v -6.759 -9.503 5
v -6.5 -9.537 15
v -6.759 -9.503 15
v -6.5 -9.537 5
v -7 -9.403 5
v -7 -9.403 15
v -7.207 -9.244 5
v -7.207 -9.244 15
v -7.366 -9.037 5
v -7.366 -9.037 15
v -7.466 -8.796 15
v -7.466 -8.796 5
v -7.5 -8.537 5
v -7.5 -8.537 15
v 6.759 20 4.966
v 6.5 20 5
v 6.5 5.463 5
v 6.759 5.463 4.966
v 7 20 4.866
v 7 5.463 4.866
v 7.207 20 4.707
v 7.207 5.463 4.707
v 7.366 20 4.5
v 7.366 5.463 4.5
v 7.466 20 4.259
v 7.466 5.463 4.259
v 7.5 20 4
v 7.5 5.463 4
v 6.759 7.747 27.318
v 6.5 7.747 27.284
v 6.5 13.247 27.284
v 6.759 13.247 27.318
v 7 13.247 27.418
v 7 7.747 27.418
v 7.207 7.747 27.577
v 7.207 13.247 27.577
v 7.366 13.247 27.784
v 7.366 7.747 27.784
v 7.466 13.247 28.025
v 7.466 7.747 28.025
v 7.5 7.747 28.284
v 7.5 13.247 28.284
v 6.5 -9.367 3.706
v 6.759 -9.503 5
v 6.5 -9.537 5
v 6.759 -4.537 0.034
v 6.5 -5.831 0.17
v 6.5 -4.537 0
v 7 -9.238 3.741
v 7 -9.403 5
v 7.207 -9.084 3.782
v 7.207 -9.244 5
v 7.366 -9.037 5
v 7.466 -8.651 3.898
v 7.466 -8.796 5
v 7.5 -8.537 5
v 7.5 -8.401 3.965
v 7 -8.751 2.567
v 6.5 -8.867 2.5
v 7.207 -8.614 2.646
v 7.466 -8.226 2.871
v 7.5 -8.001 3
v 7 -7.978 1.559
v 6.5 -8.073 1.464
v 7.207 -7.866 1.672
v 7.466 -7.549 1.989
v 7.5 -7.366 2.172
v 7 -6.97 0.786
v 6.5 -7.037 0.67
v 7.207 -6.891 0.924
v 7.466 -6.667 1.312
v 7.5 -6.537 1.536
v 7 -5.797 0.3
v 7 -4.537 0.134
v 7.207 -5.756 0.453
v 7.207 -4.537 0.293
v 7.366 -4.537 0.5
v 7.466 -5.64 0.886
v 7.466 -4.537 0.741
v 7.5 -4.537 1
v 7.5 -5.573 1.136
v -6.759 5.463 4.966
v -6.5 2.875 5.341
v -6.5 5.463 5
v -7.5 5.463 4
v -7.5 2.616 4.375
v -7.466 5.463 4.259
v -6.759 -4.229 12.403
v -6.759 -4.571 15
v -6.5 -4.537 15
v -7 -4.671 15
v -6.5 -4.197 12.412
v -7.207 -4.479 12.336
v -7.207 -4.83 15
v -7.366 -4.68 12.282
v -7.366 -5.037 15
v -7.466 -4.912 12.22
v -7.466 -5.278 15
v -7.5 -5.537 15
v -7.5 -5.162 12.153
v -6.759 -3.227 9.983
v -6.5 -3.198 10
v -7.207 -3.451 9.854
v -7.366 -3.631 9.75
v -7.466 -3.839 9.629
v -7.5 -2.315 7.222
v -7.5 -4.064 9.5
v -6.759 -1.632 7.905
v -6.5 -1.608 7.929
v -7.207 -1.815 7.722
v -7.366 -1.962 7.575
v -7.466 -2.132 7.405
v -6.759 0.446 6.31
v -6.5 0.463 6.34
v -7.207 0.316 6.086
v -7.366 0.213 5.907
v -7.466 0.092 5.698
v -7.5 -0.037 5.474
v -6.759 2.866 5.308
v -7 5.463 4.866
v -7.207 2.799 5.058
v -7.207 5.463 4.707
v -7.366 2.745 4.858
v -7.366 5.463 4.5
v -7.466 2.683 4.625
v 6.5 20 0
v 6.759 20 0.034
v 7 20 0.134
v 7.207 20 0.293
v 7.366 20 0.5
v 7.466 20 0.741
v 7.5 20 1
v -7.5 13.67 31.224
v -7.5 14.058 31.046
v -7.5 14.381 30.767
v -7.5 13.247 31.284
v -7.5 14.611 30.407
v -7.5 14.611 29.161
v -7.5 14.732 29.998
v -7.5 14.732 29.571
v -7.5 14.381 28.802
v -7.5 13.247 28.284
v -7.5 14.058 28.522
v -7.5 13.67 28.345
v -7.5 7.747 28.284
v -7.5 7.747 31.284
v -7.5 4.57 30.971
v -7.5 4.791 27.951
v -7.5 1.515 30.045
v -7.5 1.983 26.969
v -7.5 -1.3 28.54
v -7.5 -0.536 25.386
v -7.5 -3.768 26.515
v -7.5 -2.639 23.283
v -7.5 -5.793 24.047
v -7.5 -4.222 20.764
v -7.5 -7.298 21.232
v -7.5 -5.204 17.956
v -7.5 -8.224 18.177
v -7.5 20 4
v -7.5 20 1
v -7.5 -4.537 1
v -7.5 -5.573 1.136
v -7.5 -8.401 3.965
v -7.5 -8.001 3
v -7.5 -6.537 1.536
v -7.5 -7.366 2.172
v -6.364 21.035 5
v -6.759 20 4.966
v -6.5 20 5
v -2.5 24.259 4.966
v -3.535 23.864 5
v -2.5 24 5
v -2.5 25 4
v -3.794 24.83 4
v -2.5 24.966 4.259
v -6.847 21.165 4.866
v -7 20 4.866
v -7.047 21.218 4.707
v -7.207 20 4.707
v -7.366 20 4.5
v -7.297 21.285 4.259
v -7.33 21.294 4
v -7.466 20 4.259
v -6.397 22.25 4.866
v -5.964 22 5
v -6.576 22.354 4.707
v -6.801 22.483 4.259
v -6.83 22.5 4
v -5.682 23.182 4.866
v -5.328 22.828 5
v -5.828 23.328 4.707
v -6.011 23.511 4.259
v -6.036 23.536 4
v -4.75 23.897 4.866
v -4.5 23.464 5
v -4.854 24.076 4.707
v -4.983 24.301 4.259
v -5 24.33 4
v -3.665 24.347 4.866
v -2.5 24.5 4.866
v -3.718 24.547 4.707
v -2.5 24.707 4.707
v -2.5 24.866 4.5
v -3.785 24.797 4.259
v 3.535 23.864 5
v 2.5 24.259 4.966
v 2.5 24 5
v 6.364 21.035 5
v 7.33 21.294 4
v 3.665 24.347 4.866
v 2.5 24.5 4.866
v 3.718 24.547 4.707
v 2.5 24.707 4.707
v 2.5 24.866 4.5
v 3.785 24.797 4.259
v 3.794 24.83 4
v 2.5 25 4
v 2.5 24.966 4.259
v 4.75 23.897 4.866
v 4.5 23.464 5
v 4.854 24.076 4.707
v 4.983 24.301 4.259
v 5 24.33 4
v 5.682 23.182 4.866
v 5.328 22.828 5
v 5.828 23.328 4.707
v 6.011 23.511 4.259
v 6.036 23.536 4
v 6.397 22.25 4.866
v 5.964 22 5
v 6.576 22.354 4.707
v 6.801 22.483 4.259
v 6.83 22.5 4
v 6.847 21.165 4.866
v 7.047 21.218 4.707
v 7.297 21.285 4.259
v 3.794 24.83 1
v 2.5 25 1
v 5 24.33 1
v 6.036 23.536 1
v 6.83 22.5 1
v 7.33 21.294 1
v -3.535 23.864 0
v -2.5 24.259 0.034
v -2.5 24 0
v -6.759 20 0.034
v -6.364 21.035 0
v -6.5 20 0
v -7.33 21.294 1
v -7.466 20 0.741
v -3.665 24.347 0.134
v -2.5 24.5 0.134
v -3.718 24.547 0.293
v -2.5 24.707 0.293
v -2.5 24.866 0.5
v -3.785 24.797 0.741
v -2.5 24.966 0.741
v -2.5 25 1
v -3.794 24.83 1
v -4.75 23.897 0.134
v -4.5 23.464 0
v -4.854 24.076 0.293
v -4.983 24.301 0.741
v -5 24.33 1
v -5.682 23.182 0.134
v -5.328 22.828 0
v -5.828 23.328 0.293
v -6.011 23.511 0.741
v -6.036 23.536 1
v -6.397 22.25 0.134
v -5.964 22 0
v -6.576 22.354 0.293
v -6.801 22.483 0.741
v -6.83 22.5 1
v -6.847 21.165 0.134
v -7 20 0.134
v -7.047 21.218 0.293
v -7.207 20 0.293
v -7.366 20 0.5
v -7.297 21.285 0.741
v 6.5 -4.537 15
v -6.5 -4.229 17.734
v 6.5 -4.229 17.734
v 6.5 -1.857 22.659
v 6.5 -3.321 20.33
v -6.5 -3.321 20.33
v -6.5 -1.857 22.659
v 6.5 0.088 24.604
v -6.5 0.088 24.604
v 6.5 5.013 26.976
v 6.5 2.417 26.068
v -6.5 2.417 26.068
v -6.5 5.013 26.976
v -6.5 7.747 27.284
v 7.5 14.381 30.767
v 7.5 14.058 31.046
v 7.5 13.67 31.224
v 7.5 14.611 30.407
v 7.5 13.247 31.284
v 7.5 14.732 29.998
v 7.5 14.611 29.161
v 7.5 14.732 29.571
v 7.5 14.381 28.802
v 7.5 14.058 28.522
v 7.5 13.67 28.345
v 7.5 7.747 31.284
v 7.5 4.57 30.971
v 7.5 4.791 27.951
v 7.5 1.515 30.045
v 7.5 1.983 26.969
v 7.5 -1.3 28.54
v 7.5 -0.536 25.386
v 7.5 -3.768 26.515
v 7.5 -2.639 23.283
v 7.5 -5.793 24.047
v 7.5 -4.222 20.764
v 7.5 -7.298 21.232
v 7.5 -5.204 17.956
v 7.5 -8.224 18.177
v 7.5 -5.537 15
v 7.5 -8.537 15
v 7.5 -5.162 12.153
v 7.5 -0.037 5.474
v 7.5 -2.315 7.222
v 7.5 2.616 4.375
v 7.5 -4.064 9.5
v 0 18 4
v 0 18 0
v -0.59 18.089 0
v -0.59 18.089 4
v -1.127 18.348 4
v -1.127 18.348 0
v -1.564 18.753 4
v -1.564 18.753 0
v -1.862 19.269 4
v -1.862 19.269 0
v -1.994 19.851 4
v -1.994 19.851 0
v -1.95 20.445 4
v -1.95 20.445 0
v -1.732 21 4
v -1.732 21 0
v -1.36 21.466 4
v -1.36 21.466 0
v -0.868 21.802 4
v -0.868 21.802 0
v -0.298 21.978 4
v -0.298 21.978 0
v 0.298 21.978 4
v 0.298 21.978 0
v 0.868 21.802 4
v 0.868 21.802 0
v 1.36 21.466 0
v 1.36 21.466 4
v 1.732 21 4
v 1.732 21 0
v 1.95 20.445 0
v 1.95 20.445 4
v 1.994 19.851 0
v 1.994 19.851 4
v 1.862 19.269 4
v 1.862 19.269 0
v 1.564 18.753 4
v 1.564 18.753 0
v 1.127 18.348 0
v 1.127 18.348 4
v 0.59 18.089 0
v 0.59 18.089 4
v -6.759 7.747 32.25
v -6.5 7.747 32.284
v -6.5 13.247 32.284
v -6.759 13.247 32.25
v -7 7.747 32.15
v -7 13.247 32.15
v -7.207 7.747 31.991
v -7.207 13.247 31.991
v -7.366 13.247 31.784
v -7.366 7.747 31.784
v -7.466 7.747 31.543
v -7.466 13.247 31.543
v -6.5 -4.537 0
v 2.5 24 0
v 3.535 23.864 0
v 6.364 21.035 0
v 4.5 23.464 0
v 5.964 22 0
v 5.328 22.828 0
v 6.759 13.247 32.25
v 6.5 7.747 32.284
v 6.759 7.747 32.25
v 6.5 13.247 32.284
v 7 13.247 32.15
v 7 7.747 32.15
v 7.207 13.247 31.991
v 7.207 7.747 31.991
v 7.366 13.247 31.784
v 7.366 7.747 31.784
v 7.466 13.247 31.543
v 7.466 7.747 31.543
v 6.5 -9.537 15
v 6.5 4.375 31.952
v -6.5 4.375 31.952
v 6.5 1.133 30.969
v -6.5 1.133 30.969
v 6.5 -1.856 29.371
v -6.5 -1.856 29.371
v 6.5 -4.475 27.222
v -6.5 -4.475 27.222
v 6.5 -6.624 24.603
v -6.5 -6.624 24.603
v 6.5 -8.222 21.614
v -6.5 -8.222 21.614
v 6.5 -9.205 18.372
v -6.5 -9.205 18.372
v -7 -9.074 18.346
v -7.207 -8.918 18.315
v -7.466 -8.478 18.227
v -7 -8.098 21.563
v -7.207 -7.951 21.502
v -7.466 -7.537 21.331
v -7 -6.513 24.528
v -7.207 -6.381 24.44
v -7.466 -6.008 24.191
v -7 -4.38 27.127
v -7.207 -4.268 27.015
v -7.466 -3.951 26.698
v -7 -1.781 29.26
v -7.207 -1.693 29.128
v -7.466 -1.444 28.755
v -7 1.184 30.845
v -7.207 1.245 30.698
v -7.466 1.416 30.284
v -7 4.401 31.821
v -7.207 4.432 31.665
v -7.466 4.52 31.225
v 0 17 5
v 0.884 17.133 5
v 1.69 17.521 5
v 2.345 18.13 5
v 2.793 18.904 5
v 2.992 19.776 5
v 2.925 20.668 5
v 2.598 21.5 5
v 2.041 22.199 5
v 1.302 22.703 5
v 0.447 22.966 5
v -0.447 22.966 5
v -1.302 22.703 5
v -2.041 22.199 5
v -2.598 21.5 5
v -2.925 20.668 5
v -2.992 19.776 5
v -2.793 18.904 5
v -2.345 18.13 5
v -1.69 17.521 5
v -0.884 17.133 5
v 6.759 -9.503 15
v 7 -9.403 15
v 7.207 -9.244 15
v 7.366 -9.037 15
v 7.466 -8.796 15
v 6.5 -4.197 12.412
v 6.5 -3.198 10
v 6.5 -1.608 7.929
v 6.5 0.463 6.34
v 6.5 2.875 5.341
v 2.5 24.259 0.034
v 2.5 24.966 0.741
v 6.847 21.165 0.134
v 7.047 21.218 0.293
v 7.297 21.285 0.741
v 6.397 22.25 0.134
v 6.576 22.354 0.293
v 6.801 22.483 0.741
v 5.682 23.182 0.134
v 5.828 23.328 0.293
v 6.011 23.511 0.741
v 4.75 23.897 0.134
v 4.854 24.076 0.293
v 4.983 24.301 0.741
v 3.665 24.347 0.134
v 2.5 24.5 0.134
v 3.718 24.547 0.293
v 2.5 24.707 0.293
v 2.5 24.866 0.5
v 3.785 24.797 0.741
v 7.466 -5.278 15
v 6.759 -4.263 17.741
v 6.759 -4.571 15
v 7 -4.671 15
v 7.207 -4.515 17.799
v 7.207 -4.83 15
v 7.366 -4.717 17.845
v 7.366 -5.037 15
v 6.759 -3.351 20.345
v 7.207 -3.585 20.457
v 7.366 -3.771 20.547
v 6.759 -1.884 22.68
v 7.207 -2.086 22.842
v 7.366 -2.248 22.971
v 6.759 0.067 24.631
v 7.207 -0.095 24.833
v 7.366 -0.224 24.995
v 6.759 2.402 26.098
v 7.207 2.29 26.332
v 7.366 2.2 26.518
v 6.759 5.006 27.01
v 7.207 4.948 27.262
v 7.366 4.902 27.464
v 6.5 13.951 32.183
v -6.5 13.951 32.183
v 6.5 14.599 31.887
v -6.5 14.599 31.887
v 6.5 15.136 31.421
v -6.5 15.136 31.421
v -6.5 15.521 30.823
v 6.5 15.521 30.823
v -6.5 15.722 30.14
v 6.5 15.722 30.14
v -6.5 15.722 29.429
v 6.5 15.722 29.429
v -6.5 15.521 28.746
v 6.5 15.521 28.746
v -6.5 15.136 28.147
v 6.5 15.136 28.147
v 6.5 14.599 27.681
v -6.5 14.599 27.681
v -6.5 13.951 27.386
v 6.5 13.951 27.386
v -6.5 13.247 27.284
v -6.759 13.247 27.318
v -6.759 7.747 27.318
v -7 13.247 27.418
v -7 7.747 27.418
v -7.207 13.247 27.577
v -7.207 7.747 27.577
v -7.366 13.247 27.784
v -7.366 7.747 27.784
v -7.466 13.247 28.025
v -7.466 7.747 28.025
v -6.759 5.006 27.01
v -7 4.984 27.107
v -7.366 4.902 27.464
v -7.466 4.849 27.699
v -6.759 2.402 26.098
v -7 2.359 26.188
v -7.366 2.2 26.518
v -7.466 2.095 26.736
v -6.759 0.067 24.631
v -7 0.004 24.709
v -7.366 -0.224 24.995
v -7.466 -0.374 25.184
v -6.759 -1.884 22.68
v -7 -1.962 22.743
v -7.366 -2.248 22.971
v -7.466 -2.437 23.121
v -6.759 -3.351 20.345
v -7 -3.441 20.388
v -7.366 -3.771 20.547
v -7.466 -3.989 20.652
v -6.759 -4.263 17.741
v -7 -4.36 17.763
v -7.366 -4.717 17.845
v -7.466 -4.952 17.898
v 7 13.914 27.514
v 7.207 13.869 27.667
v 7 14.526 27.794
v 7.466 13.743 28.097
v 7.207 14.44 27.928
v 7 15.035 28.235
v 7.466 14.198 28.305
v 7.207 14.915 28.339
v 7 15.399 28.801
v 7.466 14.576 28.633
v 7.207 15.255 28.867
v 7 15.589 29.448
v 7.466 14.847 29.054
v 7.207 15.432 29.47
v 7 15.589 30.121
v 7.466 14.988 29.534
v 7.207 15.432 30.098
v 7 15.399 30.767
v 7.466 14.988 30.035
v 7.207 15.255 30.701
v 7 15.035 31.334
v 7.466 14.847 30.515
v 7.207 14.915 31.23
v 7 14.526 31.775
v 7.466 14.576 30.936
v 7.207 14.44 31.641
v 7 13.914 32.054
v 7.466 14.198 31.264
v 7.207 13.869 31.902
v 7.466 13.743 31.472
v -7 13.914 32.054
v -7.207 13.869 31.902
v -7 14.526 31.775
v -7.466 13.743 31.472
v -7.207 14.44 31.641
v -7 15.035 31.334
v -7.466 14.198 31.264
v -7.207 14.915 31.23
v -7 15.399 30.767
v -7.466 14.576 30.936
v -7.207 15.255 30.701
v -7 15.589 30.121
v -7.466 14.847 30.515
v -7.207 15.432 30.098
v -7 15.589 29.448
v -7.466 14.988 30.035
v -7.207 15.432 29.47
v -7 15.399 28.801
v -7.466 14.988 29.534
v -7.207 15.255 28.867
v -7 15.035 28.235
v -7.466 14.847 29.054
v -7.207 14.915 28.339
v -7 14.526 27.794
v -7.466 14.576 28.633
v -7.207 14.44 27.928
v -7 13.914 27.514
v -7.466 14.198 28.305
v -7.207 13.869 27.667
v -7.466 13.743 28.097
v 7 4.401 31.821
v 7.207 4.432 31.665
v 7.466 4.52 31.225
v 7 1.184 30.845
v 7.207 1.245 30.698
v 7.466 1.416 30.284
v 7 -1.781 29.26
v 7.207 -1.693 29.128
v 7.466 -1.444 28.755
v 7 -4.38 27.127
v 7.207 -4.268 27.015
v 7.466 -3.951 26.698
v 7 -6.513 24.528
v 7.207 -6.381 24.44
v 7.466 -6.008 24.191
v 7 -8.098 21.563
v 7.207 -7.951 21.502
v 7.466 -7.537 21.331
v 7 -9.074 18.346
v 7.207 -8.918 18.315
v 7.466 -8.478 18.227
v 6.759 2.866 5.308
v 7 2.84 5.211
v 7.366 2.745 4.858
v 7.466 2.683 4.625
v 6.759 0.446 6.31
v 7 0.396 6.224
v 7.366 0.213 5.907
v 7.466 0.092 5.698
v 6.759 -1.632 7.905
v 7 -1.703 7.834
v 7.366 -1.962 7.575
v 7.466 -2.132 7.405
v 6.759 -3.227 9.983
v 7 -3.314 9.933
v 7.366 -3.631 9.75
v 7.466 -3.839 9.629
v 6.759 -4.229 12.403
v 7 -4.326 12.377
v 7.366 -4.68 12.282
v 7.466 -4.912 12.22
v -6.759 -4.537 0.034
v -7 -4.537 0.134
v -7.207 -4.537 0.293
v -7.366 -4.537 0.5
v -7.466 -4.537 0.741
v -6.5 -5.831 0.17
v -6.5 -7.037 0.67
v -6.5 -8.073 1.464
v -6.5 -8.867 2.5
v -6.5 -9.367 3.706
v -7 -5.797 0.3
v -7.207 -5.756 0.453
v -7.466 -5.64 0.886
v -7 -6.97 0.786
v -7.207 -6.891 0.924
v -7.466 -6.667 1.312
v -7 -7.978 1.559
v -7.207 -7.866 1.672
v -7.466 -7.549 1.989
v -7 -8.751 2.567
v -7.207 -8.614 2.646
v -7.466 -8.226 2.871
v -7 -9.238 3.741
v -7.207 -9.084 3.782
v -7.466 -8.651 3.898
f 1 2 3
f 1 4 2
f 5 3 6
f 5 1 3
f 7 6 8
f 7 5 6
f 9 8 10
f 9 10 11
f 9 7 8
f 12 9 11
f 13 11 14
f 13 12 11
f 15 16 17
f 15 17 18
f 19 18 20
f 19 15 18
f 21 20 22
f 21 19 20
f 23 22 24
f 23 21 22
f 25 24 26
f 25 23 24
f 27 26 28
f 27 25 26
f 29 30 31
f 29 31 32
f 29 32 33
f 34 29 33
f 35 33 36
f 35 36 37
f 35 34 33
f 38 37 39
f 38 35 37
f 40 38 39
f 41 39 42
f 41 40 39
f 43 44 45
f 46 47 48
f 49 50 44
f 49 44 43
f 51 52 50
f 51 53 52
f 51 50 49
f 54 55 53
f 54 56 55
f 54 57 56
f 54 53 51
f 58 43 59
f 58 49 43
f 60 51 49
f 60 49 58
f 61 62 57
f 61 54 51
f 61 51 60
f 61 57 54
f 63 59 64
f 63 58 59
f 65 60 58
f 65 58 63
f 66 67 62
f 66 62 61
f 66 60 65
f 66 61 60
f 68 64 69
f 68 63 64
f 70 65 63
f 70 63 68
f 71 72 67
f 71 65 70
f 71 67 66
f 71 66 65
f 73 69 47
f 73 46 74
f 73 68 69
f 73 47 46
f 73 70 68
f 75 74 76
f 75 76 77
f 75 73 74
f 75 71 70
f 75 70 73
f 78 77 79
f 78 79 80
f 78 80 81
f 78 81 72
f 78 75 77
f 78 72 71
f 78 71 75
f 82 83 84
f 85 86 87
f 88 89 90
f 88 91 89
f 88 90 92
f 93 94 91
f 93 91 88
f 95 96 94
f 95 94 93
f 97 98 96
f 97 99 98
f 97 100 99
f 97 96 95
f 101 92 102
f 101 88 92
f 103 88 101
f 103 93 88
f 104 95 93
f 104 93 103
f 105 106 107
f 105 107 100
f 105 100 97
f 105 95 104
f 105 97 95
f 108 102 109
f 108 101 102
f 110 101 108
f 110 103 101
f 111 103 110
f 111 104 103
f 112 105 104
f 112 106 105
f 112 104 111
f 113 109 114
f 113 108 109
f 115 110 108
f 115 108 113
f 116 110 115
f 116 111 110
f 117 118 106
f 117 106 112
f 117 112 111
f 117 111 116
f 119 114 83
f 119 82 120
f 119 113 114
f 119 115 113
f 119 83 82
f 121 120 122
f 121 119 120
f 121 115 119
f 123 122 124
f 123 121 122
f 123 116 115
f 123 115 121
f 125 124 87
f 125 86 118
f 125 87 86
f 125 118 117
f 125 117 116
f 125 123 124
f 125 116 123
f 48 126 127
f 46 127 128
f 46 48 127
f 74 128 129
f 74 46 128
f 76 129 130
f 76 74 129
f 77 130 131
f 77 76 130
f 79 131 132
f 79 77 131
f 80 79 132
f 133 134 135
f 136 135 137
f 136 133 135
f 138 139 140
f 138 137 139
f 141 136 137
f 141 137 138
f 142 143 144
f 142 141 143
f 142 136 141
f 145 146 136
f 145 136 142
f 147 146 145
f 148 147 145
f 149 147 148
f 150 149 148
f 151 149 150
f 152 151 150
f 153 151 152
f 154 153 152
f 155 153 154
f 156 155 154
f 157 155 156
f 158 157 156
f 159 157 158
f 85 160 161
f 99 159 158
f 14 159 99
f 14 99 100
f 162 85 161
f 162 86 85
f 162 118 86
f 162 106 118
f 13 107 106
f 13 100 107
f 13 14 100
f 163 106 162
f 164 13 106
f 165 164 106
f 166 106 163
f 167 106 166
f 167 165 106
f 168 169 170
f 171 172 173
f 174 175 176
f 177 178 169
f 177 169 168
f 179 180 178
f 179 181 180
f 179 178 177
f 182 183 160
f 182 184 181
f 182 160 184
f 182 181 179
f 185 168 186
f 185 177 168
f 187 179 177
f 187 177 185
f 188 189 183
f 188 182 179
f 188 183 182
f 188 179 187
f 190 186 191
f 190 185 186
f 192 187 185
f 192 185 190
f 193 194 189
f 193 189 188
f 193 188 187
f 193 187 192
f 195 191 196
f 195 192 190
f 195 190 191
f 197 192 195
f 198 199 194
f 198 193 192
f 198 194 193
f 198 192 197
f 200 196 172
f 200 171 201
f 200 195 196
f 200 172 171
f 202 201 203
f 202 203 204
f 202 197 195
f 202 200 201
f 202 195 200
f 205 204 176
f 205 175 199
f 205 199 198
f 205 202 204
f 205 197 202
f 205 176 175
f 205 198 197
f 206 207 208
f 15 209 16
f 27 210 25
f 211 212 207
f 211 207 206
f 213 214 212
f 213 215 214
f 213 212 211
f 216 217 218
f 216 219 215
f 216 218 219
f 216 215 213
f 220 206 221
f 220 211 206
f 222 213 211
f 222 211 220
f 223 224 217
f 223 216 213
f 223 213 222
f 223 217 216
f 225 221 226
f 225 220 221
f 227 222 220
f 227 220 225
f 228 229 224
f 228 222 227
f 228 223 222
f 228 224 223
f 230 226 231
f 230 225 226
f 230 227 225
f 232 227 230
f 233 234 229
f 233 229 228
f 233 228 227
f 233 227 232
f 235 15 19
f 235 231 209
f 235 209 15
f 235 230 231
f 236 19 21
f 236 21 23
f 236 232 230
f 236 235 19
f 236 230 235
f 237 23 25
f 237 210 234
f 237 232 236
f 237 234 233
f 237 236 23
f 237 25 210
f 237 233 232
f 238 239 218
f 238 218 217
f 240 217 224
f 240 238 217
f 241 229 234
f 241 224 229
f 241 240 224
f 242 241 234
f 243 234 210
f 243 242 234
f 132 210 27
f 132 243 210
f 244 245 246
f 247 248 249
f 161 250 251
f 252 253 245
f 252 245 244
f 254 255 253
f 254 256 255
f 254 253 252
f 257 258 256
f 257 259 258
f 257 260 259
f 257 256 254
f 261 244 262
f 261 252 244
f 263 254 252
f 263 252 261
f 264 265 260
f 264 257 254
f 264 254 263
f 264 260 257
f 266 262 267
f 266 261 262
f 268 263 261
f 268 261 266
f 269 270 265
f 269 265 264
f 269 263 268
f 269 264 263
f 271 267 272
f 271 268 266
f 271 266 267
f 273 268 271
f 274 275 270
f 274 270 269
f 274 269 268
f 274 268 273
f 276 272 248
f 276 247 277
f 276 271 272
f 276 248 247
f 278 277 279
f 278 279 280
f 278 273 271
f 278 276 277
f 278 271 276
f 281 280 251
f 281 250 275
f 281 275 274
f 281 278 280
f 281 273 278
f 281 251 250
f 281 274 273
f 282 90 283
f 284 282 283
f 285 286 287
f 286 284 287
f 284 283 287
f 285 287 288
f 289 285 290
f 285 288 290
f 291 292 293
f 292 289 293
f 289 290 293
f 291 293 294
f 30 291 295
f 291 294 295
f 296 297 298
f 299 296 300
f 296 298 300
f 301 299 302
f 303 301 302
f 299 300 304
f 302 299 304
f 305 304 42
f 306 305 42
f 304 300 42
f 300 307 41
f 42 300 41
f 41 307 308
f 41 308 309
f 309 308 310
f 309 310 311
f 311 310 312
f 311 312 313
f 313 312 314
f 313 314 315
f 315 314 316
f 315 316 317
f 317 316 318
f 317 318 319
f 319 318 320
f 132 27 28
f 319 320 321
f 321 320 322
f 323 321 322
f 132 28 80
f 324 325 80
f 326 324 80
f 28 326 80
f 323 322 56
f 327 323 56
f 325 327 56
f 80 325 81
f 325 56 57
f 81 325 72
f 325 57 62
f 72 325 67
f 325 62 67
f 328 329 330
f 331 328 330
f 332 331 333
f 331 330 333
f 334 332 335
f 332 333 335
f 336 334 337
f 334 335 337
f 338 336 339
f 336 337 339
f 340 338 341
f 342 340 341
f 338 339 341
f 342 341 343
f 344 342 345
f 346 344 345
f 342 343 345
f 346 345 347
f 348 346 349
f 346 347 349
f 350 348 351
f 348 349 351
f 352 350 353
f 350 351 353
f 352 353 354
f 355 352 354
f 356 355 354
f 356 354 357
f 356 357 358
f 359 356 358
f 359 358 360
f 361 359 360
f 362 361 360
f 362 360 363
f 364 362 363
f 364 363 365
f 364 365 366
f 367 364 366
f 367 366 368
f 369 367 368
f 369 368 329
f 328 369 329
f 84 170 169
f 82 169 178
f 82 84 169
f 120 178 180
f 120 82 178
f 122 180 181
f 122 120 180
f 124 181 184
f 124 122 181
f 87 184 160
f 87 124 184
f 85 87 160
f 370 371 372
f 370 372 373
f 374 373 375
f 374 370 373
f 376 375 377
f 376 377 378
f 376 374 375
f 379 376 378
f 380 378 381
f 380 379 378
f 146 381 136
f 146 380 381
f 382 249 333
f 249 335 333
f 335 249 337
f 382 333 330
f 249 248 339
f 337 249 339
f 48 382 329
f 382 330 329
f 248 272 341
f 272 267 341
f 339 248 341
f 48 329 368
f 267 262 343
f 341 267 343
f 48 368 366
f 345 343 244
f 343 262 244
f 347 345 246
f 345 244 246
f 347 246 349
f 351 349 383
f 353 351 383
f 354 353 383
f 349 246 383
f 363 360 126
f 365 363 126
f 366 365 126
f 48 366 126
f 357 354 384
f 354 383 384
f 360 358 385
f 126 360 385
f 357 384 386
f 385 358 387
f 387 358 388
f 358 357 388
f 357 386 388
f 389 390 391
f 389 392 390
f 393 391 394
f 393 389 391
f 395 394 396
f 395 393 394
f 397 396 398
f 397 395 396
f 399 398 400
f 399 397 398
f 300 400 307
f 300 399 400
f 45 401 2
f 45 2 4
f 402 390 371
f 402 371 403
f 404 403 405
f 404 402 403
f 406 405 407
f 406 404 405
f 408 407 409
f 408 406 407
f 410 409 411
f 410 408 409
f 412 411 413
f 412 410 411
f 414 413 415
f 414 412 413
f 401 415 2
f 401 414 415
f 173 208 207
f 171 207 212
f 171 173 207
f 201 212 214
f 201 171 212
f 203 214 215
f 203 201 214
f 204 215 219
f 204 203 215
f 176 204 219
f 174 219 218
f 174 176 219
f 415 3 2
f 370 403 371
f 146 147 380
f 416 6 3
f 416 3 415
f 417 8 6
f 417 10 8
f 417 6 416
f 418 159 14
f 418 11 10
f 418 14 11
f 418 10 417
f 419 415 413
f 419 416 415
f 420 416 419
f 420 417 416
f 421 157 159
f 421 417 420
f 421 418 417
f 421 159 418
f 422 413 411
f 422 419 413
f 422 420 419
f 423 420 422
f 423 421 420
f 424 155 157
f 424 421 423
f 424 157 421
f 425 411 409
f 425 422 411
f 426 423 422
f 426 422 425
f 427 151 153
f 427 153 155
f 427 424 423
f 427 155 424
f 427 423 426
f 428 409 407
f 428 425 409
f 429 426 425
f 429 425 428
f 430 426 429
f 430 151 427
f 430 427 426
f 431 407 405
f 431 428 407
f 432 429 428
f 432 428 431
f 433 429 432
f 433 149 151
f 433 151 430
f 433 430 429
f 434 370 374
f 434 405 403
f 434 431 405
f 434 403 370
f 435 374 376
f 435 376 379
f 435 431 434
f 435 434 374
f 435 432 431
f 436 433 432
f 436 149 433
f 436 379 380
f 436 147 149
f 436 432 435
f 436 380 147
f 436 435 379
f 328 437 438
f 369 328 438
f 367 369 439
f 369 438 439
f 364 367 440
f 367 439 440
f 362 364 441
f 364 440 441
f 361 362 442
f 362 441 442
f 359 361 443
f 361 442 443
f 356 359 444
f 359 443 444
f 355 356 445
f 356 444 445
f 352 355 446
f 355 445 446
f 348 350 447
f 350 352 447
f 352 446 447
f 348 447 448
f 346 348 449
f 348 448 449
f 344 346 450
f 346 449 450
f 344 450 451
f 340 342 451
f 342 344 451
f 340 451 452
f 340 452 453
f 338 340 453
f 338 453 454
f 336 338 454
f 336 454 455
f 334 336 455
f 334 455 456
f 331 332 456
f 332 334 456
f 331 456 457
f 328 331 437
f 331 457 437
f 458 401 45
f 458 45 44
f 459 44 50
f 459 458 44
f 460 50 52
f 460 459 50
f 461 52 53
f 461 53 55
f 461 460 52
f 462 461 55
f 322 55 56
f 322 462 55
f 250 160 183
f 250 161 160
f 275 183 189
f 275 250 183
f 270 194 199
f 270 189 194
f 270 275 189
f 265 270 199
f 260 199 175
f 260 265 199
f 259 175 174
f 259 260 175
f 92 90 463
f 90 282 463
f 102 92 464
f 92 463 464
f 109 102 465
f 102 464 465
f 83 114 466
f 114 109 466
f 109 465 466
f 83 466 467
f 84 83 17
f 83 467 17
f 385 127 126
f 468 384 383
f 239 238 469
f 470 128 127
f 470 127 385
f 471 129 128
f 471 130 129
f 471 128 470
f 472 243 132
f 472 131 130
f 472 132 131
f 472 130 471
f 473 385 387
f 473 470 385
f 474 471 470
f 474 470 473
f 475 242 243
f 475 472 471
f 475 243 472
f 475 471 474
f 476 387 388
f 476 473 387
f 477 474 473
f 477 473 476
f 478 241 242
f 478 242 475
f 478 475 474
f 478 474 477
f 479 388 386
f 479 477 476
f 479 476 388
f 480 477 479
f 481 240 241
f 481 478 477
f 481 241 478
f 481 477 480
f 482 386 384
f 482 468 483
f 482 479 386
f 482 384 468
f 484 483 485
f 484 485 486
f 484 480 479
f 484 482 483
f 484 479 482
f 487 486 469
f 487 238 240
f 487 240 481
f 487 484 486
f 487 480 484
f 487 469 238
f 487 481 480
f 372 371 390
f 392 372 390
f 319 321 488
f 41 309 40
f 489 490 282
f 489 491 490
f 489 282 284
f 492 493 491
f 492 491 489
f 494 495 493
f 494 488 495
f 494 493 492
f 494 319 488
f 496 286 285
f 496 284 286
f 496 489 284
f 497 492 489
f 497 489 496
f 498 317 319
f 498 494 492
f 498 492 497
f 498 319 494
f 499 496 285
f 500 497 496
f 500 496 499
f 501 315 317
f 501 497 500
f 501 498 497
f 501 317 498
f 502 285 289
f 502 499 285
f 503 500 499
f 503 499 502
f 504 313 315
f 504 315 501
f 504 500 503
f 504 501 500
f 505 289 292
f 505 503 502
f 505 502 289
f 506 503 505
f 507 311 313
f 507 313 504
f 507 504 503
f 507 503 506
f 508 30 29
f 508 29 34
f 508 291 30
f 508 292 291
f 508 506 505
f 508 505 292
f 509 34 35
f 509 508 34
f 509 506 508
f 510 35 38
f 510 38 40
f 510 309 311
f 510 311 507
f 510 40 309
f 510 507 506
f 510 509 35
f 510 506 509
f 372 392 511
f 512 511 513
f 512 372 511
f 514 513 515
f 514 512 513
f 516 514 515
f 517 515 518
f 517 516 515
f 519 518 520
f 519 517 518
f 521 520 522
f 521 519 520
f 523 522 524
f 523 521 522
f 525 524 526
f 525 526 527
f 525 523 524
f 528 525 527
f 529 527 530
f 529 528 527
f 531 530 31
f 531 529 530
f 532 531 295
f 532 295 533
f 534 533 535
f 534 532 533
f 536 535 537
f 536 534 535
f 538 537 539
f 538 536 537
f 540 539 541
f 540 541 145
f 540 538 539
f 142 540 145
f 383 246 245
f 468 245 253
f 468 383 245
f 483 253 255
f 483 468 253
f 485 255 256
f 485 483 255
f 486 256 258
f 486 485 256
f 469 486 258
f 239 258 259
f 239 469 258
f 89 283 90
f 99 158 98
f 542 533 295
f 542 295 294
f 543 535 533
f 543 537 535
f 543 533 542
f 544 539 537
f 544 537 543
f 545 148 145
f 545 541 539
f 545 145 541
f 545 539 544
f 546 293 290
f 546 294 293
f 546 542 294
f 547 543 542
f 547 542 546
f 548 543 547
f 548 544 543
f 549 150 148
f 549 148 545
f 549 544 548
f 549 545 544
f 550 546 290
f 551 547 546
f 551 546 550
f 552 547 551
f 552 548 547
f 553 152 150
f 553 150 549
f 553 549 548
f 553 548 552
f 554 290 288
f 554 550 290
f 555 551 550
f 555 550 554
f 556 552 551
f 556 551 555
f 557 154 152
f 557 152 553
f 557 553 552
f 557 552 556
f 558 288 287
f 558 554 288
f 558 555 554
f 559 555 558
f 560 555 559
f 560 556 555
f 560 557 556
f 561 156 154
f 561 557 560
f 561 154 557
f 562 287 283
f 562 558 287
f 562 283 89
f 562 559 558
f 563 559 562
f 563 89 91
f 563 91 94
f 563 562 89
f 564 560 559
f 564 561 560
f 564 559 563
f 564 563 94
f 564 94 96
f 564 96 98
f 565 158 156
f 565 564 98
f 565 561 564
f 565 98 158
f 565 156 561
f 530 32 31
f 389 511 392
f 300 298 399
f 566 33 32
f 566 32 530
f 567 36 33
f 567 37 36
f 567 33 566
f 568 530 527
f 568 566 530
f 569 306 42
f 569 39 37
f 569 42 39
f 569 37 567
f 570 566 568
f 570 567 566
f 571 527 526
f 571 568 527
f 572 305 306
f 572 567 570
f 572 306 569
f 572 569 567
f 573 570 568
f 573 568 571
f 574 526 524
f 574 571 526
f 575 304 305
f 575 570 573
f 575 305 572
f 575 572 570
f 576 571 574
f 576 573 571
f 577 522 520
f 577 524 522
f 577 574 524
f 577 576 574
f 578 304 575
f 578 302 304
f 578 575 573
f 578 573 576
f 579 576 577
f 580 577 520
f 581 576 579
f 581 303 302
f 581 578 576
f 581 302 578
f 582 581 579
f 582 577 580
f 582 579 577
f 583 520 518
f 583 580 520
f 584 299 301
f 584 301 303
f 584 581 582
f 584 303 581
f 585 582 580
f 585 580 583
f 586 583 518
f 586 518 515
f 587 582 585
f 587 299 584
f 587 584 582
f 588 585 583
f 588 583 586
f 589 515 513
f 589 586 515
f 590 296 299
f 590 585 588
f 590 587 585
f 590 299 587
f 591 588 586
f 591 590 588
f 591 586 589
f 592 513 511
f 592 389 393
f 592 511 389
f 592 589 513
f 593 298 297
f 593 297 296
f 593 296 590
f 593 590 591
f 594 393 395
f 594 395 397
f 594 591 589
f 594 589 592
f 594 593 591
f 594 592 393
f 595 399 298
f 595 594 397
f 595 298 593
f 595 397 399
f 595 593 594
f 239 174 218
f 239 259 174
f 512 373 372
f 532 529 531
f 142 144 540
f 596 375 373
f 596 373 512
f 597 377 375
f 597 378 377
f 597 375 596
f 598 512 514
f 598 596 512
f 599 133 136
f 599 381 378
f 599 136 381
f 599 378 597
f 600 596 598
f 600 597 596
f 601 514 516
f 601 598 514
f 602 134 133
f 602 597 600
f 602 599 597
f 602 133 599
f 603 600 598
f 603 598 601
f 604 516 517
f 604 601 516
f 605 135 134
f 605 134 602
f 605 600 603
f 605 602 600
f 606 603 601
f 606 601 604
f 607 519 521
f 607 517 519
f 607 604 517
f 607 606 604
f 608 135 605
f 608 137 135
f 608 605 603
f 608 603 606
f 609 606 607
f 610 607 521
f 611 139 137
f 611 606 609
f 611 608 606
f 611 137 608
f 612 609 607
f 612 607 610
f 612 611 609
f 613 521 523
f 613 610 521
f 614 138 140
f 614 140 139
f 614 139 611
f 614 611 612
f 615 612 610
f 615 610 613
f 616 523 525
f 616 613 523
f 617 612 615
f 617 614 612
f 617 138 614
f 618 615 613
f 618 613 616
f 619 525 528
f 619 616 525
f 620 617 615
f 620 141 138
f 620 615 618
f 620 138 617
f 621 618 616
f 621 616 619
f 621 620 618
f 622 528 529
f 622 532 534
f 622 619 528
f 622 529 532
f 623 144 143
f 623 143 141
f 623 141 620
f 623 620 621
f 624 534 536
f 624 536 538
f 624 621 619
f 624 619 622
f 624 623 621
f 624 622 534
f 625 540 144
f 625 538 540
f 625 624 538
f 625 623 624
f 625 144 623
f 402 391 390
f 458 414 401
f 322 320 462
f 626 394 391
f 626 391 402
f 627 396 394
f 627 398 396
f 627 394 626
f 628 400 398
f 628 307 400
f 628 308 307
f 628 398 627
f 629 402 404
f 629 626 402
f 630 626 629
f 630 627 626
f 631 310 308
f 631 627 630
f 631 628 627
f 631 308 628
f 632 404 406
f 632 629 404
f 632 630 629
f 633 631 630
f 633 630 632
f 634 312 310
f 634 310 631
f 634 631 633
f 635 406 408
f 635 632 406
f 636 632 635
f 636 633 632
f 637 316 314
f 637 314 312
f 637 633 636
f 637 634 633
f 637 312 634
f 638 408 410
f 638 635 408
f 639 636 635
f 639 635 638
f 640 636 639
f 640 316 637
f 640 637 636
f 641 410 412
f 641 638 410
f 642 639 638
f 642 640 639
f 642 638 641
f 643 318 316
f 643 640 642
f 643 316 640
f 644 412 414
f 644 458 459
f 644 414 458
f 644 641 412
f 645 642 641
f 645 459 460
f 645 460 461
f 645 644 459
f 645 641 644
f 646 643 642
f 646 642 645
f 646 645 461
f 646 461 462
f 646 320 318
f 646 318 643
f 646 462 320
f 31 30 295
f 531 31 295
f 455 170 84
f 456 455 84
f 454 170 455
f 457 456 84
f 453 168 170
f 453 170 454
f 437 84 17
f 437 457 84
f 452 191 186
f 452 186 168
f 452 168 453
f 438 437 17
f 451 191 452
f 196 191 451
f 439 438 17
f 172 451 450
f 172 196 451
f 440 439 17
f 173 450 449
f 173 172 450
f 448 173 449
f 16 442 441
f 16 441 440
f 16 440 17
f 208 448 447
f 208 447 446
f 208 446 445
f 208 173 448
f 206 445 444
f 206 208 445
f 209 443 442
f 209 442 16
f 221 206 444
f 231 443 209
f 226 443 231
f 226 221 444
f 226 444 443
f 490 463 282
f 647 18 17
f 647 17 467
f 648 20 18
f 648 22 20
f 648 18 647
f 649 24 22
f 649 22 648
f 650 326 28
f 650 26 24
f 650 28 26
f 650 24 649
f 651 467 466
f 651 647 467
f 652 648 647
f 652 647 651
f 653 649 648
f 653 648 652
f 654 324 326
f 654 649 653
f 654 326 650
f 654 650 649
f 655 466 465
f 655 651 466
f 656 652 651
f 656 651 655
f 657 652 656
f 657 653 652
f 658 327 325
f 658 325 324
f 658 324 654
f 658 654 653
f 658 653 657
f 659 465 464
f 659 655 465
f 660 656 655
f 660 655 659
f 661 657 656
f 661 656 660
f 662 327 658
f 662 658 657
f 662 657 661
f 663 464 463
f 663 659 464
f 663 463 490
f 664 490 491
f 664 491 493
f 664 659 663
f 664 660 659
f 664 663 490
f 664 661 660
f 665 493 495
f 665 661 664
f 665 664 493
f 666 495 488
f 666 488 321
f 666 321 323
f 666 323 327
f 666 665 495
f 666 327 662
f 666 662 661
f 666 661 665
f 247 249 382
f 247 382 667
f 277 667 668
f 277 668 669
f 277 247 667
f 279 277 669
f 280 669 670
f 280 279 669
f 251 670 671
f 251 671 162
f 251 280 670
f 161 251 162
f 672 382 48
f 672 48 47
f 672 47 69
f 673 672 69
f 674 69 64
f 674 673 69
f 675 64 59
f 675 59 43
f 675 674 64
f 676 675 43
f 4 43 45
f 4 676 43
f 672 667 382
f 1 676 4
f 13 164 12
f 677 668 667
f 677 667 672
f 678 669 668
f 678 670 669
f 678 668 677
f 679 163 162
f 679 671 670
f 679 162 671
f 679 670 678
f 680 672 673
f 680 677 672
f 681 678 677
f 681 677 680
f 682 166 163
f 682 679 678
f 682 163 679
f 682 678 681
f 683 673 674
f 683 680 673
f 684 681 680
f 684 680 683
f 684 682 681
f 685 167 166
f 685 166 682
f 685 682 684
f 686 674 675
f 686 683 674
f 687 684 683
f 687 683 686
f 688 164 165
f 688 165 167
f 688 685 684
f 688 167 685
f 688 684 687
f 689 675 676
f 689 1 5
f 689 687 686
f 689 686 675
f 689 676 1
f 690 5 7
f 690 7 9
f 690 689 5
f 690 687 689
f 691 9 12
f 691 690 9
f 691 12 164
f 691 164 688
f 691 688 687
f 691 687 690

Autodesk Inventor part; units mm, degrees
ref_plane "YZ Plane" through (0, 0, 0) normal (1, 0, 0) x (0, 1, 0)
ref_plane "XZ Plane" through (0, 0, 0) normal (0, 1, 0) x (-1, 0, 0)
ref_plane "XY Plane" through (0, 0, 0) normal (0, 0, 1) x (1, 0, 0)
sketch "Sketch1" plane through (0, 0, 0) normal (0, 0, 1) x (1, 0, 0)
  line L0 (-2.5, 25) -> (2.5, 25)
  line L1 (7.5, 20) -> (7.5, -20)
  line L2 (2.5, -25) -> (-2.5, -25)
  line L3 (-7.5, -20) -> (-7.5, 20)
  line L4 (-7.5, 25) -> (7.5, -25) construction
  line L5 (7.5, 25) -> (-7.5, -25) construction
  arc A0 (-2.5, 25) -> (-7.5, 20) centre (-2.5, 20) ccw
  arc A1 (7.5, 20) -> (2.5, 25) centre (2.5, 20) ccw
  arc A2 (2.5, -25) -> (7.5, -20) centre (2.5, -20) ccw
  arc A3 (-7.5, -20) -> (-2.5, -25) centre (-2.5, -20) ccw
  circle A4 centre (0, 20) radius 1
  point P0 (0, 0)
  dimension "d0" = 15
  dimension "d1" = 50
  dimension "d2" = 5
  dimension "d5" = 2
extrude "Extrusion2" add sketch "Sketch1" along normal blind 5
sketch "Sketch3" plane through (0, 0, 5) normal (0, 0, 1) x (1, 0, 0)
  circle A0 centre (0, 20) radius 1 projected
  point P0 (0, 0)
hole "Hole1" at (0, 20, 5) direction (0, 0, -1) diameter 4 end through all countersink diameter 6 countersink angle 90
sketch "Sketch4" plane through (0, 0, 0) normal (1, 0, 0) x (0, 1, 0)
  line L0 (28.9186, 2.2501) -> (-11.8341, 2.2501) construction
  line L1 (20, 0) -> (-20, 0) projected
  line L2 (-20, 5) -> (20, 5) construction
  line L3 (-2.191, 5) -> (-11.8341, 5) construction
  line L4 (-7.253, 15) -> (-7.253, 5)
  arc A0 (7.747, 30) -> (-7.253, 15) centre (7.747, 15) ccw
  line L5 (7.747, 30) -> (15.747, 30)
  point P0 (0, 0)
  point P1 (8.5422, 2.2501)
  dimension "d24" = 10
  dimension "d25" = 8
sketch "Sketch5" plane through (0, 0, 5) normal (0, 0, 1) x (1, 0, 0)
  line L0 (7.5, 20) -> (7.5, -20) projected
  line L1 (-7.5, -4.5373) -> (7.5, -4.5373)
  line L2 (7.5, -4.5373) -> (7.5, -9.5373)
  line L3 (7.5, -9.5373) -> (-7.5, -9.5373)
  line L4 (-7.5, -9.5373) -> (-7.5, -4.5373)
  line L5 (-7.5, -4.5373) -> (7.5, -9.5373) construction
  line L6 (7.5, -4.5373) -> (-7.5, -9.5373) construction
  point P0 (0, 0)
  point P1 (0, -7.0373)
  dimension "d17" = 15
  dimension "d18" = 5
sweep "Sweep3" add profiles "Sketch5" path "Sketch4" path curves L4 A0 L5
sketch "Sketch8" plane through (0, 0, 5) normal (0, 0, 1) x (1, 0, 0)
  line L0 (7.5, -9.5373) -> (-7.5, -9.5373) projected
  line L1 (-7.5, -4.5373) -> (7.5, -4.5373) projected
  point P0 (0, 0)
sketch "Sketch9" plane through (7.5, -20, 0) normal (1, 0, 0) x (0, 0, -1)
  line L0 (-5, 10.4627) -> (-15.4627, 10.4627)
  line L1 (-5, 10.4627) -> (-15.4627, 10.4627)
  line L2 (-5, 10.4627) -> (-15.4627, 10.4627)
  line L3 (-5, 10.4627) -> (-5, 0) projected
  line L4 (-5, 10.4627) -> (-5, 0)
  arc A0 (-5, 0) -> (-15.4627, 10.4627) centre (-15.4627, 0) ccw
  point P0 (0, 20)
  dimension "d31" = 10.4627
  dimension "d32" = 10.4627
sweep "Sweep4" add profiles "Sketch9" path "Sketch8" path curves L0
sketch "Sketch10" plane through (-7.5, -20, 0) normal (-1, 0, 0) x (0, 0, 1)
  line L0 (27.2843, 27.747) -> (27.2843, 35.747)
  line L1 (32.2843, 27.747) -> (32.2843, 35.747)
  line L2 (27.2843, 35.747) -> (32.2843, 35.747)
  arc A0 (32.2843, 33.247) -> (27.2843, 33.247) centre (29.7843, 33.247) ccw
  line L3 (27.2843, 33.247) -> (27.2843, 35.747)
  line L4 (32.2843, 35.747) -> (32.2843, 33.247)
  line L5 (27.2843, 35.747) -> (32.2843, 35.747)
  point P0 (0, 20)
  point P1 (29.7843, 35.747)
extrude "Extrusion3" cut sketch "Sketch10" against normal through all
sketch "Sketch11" plane through (-7.5, -4.5373, 5) normal (0, 1, 0) x (1, 0, 0)
  line L0 (0, 0) -> (15, 0) projected
  point P0 (7.5, 5)
sketch "Sketch12" plane through (-7.5, -20, 0) normal (-1, 0, 0) x (0, 0, 1)
  line L0 (5, 40) -> (5, 15.4627) projected
  line L1 (5, 15.4627) -> (15, 15.4627) projected
  line L2 (5, 15.4627) -> (15, 15.4627)
  line L3 (5, 15.4627) -> (5, 25.4627)
  line L4 (5, 15.4627) -> (5, 40) projected
  arc A0 (5, 25.4627) -> (15, 15.4627) centre (15, 25.4627) ccw
  point P0 (0, 20)
  dimension "d37" = 10
sweep "Sweep5" add profiles "Sketch12" path "Sketch11"
sketch "Sketch15" plane through (-7.5, -20, 0) normal (-1, 0, 0) x (0, 0, 1)
  arc A0 (5, 25.4627) -> (15, 15.4627) centre (15, 25.4627) ccw projected
  arc A1 (15, 15.4627) -> (27.2843, 27.747) centre (15, 27.747) ccw projected
  line L0 (15.4627, 10.4627) -> (5, 10.4627)
  arc A2 (0, 15.4627) -> (5, 10.4627) centre (5, 15.4627) ccw
  line L1 (0, 0) -> (0, -5) projected
  line L2 (0, -5) -> (5, -5) projected
  line L3 (5, -5) -> (5, 0) projected
  arc A3 (15.4627, 10.4627) -> (5, 0) centre (15.4627, 0) ccw projected
  line L4 (0, 0) -> (5, 0) projected
  line L5 (0, 0) -> (0, 15.4627)
  point P0 (0, 20)
  dimension "d43" = 5
extrude "Extrusion5" cut sketch "Sketch15" against normal through all
fillet "Fillet1" radius 1 33 edges at (7.5, -0.9393, 23.6863) (7.5, 10.497, 27.2843) (7.5, 15.747, 29.7843) (-7.5, 10.497, 32.2843) (-7.5, -4.4748, 27.2219) (-7.5, -9.5373, 10) (7.5, 10.497, 32.2843) (7.5, -4.4748, 27.2219) (7.5, -9.5373, 10) (0, 13.247, 32.2843) (0, 7.747, 32.2843) (0, -9.5373, 15) (0, -9.5373, 5) (7.5, -8.0728, 1.4645) (7.5, 7.7314, 0) (6.0355, 23.5355, 0) (0, 25, 0) (-6.0355, 23.5355, 0) (-7.5, 7.7314, 0) (-7.5, -8.0728, 1.4645) (-7.5, 15.747, 29.7843) (0, -4.5373, 15) (0, 7.747, 27.2843) (-7.5, -0.9393, 23.6863) (-7.5, 10.497, 27.2843) (0, 13.247, 27.2843) (-7.5, -1.6084, 7.9289) (-7.5, 12.7314, 5) (-6.0355, 23.5355, 5) (0, 25, 5) (6.0355, 23.5355, 5) (7.5, 12.7314, 5) (7.5, -1.6084, 7.9289)
sketch "Sketch13" plane through (7.5, -20, 0) normal (1, 0, 0) x (0, 0, -1)
  arc A0 (-5, 0) -> (-15.4627, 10.4627) centre (-15.4627, 0) ccw projected
  line L0 (0, 0) -> (0, 9.0751)
  line L1 (0, 0) -> (0, 40) projected
  line L2 (0, -5) -> (0, 0) projected
  arc A1 (-5, 0) -> (0, 0) centre (-2.5, 0) ccw
  line L3 (0, -5) -> (-5, -5) projected
  line L4 (0, -5) -> (-5, -5)
  line L5 (-5, 0) -> (-5, -5) projected
  line L6 (-5, -5) -> (-5, 0)
  point P0 (0, 20)
equation "\"d31\" = d32"
properties part number "single_hook"
